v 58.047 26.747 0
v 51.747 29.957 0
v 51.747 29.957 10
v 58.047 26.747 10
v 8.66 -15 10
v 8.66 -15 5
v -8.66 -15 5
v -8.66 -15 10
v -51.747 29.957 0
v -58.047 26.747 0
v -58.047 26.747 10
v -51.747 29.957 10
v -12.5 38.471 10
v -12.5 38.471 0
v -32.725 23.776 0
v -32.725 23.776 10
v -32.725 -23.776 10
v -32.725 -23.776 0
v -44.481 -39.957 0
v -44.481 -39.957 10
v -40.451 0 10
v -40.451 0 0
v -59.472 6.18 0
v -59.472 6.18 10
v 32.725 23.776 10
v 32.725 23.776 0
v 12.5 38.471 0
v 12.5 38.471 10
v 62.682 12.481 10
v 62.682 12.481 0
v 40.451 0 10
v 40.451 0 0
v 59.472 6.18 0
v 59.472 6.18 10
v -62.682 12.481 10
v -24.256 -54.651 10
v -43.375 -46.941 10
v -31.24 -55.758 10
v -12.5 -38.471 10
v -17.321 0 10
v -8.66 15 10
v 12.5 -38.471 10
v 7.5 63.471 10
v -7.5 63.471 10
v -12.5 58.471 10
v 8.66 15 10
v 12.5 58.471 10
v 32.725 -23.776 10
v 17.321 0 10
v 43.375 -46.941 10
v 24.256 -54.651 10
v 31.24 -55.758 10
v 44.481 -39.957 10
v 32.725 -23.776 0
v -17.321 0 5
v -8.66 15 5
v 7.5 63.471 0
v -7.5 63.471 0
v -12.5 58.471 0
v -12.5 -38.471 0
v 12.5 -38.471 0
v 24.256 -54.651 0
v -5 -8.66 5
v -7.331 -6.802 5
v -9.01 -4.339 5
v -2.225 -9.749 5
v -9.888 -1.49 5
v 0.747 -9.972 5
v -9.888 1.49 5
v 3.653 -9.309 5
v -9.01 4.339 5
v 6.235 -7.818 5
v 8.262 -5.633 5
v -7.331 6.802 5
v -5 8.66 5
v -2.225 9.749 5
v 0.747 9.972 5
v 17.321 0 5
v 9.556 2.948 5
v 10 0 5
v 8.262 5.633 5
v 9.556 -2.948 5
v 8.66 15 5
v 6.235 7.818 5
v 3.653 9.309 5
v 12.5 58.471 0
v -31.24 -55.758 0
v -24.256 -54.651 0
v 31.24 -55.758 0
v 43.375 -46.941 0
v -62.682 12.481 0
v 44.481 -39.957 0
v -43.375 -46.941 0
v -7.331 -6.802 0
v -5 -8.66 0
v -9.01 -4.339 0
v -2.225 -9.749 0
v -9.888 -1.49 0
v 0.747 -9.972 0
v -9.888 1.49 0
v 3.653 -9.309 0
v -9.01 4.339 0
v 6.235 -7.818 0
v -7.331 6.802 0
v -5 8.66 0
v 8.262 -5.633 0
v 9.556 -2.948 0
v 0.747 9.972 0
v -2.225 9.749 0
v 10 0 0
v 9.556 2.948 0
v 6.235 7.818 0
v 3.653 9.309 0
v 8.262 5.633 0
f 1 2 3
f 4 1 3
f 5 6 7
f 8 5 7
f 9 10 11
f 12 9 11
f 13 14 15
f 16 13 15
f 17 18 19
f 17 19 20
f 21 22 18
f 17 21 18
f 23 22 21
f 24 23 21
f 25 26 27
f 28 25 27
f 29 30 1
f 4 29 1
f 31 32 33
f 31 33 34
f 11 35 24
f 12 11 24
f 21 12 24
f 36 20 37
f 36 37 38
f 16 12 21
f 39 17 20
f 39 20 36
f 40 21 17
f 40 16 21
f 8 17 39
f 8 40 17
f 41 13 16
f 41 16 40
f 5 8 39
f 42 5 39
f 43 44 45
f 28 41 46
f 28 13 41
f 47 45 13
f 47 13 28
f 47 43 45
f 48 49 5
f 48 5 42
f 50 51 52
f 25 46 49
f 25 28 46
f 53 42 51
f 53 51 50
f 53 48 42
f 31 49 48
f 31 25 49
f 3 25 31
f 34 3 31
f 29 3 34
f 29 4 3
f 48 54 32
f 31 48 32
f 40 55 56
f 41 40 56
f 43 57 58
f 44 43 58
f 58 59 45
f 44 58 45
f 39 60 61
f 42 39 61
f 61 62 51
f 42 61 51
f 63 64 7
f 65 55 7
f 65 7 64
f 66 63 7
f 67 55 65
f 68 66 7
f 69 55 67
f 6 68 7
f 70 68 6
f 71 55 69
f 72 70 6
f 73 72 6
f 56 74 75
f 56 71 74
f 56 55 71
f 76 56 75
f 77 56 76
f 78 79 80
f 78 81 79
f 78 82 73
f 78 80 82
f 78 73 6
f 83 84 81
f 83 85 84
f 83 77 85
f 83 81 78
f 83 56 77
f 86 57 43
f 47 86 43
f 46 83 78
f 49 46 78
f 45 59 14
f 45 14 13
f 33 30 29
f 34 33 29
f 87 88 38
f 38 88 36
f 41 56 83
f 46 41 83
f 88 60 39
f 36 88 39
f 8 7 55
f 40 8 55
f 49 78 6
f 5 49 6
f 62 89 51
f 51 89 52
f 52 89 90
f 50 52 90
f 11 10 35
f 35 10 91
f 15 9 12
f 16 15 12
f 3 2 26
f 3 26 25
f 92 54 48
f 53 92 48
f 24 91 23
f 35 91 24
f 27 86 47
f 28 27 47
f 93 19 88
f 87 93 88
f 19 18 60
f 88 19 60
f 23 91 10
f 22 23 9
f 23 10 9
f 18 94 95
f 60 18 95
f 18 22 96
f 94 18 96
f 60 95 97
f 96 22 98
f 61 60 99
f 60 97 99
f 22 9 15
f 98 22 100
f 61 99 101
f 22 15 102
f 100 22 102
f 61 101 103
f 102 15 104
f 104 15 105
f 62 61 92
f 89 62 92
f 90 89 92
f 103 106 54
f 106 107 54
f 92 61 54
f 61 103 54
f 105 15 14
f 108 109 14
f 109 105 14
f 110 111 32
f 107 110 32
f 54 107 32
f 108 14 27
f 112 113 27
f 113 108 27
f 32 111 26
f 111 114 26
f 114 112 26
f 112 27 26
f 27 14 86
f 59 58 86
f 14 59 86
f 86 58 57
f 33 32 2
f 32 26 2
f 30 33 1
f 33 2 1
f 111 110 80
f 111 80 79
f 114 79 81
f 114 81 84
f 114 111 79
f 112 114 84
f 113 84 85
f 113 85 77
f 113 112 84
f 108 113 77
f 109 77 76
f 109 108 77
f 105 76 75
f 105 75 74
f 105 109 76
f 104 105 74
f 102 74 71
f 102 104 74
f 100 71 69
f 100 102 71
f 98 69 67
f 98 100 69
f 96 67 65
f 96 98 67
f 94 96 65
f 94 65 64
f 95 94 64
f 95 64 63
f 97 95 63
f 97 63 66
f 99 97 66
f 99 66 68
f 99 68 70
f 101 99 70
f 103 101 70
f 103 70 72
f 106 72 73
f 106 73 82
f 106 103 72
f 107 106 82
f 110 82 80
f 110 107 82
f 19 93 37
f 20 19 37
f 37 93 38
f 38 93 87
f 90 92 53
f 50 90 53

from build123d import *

# Parameters (mm, degrees)
F1_DEPTH = 10
F2_DEPTH = 25
F3_DEPTH = 25
F4_DEPTH = 25
F5_DEPTH = 25
F6_DEPTH = 25
F7_SIZE  = 5
F0_R     = 10
F8_DEPTH = 5


with BuildPart() as f1:
    # F0 (on Top) → F1 (new body)
    with BuildSketch(Plane.XY):
        Polygon((12.5, 38.4710442147), (-12.5, 38.4710442147), (-32.7254248594, 23.7764129074), (-40.4508497187, 0), (-32.7254248594, -23.7764129074), (-12.5, -38.4710442147), (12.5, -38.4710442147), (32.7254248594, -23.7764129074), (40.4508497187, 0), (32.7254248594, 23.7764129074), align=None)
        Polygon((-17.3205080757, 0), (-8.6602540378, 15), (8.6602540378, 15), (17.3205080757, 0), (8.6602540378, -15), (-8.6602540378, -15), align=None, mode=Mode.SUBTRACT)
    extrude(amount=F1_DEPTH)

    # F2 (add): a face of the model
    f2_faces = [f1.faces().sort_by_distance(p)[0] for p in [
        (36.5881372891, 11.8882064537, 5),
    ]]
    extrude(f2_faces, amount=F2_DEPTH)

    # F3 (add): a face of the model
    f3_faces = [f1.faces().sort_by_distance(p)[0] for p in [
        (0, 38.4710442147, 5),
    ]]
    extrude(f3_faces, amount=F3_DEPTH)

    # F4 (add): a face of the model
    f4_faces = [f1.faces().sort_by_distance(p)[0] for p in [
        (22.6127124297, -31.123728561, 5),
    ]]
    extrude(f4_faces, amount=F4_DEPTH)

    # F5 (add): a face of the model
    f5_faces = [f1.faces().sort_by_distance(p)[0] for p in [
        (-36.5881372891, 11.8882064537, 5),
    ]]
    extrude(f5_faces, amount=F5_DEPTH)

    # F6 (add): a face of the model
    f6_faces = [f1.faces().sort_by_distance(p)[0] for p in [
        (-22.6127124297, -31.123728561, 5),
    ]]
    extrude(f6_faces, amount=F6_DEPTH)

    # F7
    f7_edges = [f1.edges().sort_by_distance(p)[0] for p in [
        (-64.227263, 7.725425, 5),
        (-56.501838, 31.501838, 5),
        (-12.5, 63.471044, 5),
        (-47.420056, -44.001838, 5),
        (-27.194631, -58.696469, 5),
        (27.194631, -58.696469, 5),
        (64.227263, 7.725425, 5),
        (12.5, 63.471044, 5),
        (56.501838, 31.501838, 5),
        (47.420056, -44.001838, 5),
    ]]
    chamfer(f7_edges, length=F7_SIZE)

    # F0 (on Top) → F8 (join)
    with BuildSketch(Plane.XY):
        Polygon((8.6602540378, 15), (-8.6602540378, 15), (-17.3205080757, 0), (-8.6602540378, -15), (8.6602540378, -15), (17.3205080757, 0), align=None)
        Circle(F0_R, mode=Mode.SUBTRACT)
    extrude(amount=F8_DEPTH)


solid = f1.part
